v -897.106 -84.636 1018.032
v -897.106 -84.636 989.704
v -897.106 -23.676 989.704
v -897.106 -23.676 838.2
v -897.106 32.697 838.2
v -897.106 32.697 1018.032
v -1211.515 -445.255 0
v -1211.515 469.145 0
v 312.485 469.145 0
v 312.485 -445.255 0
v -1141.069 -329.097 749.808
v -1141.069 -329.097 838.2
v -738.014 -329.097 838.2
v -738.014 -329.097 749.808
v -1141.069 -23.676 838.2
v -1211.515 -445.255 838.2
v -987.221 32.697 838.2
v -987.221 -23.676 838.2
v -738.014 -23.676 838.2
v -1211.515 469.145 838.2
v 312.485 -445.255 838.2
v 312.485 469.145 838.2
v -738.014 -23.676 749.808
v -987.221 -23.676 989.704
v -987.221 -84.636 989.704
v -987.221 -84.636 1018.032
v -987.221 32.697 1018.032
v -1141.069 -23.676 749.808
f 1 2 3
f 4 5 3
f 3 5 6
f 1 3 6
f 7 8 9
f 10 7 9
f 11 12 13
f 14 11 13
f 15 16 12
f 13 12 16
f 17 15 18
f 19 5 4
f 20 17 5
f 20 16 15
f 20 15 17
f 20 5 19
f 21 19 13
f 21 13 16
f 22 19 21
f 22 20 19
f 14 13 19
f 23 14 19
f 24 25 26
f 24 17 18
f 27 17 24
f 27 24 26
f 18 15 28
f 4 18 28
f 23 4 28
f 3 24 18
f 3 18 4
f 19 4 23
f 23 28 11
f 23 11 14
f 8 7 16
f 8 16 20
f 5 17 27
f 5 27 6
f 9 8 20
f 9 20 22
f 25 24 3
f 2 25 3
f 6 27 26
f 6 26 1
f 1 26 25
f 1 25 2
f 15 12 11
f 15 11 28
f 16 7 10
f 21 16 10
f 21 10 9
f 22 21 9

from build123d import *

# Parameters (mm, degrees)
F0_W     = 1524
F0_H     = 914.4
F1_DEPTH = 838.2
F2_W     = 403.0548334122
F2_H     = 305.4204545915
F3_DEPTH = 88.392
F4_W     = 90.1145935059
F4_H     = 56.3738569617
F5_DEPTH = 179.832
F6_W     = 90.1145935059
F6_H     = 28.3284043617
F7_DEPTH = 60.96


with BuildPart() as f1:
    # F0 (on Top) → F1 (new body)
    with BuildSketch(Plane.XY):
        with Locations((-449.5147587423, 11.9446208701)):
            Rectangle(F0_W, F0_H)
    extrude(amount=F1_DEPTH)

    # F2 (on face) → F3 (cut)
    with BuildSketch(Plane.XY.offset(838.2)):
        with Locations((-939.5418763161, -176.386596635)):
            Rectangle(F2_W, F2_H)
    extrude(amount=-F3_DEPTH, mode=Mode.SUBTRACT)

    # F4 (on face) → F5 (join)
    with BuildSketch(Plane.XY.offset(838.2)):
        with Locations((-942.1632885933, 4.5105591416)):
            Rectangle(F4_W, F4_H)
    extrude(amount=F5_DEPTH)

    # F6 (on face) → F7 (join)
    with BuildSketch(Plane.XZ.offset(23.6763693392)):
        with Locations((-942.1632885933, 1003.8677978191)):
            Rectangle(F6_W, F6_H)
    extrude(amount=F7_DEPTH)


solid = f1.part
